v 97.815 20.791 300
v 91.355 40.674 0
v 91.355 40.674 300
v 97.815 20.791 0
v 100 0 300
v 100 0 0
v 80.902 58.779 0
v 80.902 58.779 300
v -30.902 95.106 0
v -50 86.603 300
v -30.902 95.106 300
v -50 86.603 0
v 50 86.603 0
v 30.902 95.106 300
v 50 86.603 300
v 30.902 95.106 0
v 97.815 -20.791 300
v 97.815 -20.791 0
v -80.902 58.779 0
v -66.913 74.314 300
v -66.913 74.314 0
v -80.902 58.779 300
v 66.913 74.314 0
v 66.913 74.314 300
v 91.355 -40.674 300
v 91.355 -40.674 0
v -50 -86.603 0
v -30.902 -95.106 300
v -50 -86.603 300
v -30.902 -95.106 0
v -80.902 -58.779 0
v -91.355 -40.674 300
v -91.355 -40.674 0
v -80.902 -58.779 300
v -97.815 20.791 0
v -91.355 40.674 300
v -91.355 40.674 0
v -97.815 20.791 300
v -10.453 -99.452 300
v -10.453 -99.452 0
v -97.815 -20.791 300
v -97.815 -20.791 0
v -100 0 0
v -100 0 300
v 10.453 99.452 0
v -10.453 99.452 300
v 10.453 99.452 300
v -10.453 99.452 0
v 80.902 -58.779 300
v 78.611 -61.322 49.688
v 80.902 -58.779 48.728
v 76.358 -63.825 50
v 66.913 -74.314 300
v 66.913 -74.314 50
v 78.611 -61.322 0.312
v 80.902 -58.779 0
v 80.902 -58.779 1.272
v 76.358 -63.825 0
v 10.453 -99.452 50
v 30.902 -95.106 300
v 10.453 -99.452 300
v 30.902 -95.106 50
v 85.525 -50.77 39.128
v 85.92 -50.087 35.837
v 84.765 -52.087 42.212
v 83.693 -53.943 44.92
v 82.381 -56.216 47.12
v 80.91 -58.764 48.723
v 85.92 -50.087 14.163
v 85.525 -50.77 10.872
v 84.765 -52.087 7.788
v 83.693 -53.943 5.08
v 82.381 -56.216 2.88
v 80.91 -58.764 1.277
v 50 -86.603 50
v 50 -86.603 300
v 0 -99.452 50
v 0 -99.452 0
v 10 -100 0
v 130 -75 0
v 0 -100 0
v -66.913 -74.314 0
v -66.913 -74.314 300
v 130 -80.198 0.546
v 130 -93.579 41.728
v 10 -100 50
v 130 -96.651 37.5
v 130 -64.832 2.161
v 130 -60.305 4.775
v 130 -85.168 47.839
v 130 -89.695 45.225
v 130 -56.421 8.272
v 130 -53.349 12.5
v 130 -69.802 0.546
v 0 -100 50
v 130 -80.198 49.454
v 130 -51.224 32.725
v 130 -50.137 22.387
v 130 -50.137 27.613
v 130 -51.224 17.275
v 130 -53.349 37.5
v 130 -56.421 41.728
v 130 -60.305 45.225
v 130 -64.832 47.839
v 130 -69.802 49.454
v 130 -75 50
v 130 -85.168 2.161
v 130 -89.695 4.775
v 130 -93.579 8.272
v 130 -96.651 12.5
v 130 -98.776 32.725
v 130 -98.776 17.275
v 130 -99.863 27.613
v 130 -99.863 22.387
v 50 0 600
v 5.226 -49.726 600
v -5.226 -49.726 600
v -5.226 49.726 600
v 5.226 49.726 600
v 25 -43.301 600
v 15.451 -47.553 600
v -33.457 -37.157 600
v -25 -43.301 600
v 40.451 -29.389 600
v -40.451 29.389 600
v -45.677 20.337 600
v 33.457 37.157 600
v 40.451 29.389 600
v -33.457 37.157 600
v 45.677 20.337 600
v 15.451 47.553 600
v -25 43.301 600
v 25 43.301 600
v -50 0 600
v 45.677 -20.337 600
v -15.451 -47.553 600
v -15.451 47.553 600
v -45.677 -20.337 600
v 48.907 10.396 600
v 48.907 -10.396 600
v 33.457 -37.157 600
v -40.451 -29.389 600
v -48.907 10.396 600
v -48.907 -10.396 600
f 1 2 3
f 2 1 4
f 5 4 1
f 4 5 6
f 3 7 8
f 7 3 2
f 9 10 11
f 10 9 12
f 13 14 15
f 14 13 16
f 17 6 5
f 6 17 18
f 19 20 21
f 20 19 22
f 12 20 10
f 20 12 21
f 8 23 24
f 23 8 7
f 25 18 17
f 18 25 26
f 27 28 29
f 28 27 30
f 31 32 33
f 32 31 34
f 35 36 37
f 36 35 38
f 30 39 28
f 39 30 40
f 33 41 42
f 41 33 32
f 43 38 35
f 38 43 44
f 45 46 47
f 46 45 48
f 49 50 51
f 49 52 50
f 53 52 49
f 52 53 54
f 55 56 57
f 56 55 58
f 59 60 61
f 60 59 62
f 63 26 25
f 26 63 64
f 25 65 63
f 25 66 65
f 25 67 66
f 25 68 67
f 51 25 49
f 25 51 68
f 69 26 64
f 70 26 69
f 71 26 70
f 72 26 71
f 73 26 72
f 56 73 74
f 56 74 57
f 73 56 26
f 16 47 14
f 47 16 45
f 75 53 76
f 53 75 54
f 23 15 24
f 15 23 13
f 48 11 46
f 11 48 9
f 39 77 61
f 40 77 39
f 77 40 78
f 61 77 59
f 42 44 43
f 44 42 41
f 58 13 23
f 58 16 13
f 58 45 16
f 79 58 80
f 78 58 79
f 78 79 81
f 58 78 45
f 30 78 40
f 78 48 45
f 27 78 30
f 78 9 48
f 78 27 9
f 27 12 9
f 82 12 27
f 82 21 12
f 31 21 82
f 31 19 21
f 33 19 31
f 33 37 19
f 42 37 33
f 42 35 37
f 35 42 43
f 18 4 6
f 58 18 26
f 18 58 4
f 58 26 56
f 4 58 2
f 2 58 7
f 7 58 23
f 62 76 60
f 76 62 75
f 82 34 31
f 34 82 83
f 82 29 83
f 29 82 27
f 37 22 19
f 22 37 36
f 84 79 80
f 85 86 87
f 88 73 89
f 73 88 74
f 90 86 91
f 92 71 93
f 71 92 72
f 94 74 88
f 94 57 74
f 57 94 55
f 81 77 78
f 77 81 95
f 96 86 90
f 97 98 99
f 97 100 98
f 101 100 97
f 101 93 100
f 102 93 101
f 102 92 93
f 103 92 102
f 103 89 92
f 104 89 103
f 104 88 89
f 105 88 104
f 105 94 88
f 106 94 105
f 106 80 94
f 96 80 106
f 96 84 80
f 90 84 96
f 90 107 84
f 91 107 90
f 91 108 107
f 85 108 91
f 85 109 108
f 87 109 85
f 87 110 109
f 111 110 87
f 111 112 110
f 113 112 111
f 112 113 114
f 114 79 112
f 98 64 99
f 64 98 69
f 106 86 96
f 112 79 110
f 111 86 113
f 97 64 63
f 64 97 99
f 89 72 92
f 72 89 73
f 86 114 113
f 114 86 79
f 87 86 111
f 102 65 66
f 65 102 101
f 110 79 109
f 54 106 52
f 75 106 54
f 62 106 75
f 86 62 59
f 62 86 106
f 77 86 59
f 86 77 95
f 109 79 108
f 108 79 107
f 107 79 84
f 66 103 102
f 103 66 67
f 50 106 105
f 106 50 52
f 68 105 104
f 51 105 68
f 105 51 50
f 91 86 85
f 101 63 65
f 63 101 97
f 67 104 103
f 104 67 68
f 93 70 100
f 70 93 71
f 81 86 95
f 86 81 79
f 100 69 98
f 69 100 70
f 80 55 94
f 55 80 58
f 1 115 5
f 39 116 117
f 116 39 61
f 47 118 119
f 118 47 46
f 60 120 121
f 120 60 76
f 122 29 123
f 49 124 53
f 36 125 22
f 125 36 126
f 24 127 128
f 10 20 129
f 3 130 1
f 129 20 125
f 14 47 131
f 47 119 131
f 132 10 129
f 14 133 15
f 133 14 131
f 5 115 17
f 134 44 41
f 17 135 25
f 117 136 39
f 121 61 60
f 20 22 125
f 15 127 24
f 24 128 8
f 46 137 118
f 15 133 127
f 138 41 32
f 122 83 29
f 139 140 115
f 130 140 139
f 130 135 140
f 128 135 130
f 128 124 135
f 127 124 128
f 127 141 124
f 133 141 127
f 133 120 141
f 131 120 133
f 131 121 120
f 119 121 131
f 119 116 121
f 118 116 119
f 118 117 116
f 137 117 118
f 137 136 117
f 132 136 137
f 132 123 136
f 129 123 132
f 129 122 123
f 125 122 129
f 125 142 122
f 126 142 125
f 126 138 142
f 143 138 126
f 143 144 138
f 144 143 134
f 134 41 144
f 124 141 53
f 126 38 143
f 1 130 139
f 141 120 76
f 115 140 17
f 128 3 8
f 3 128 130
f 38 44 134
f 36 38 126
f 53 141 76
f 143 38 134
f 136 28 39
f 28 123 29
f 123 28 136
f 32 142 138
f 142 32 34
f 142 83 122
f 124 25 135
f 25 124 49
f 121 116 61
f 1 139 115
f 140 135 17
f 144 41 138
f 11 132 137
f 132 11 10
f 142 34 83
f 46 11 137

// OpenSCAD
w=4;
da = 200;
ha = 300;
db = 50;

cylinder(d=da, h=ha);


hull()
{
    translate([100,-da/2+db/2,db/2])
    rotate([0,90,0])
    cylinder(d=db, h=30);

    translate([0,-da/2,0])
    cube([10,db,db]);
}

translate([0,0,ha])
cylinder(d1=da, d2=da/2, h=300);
